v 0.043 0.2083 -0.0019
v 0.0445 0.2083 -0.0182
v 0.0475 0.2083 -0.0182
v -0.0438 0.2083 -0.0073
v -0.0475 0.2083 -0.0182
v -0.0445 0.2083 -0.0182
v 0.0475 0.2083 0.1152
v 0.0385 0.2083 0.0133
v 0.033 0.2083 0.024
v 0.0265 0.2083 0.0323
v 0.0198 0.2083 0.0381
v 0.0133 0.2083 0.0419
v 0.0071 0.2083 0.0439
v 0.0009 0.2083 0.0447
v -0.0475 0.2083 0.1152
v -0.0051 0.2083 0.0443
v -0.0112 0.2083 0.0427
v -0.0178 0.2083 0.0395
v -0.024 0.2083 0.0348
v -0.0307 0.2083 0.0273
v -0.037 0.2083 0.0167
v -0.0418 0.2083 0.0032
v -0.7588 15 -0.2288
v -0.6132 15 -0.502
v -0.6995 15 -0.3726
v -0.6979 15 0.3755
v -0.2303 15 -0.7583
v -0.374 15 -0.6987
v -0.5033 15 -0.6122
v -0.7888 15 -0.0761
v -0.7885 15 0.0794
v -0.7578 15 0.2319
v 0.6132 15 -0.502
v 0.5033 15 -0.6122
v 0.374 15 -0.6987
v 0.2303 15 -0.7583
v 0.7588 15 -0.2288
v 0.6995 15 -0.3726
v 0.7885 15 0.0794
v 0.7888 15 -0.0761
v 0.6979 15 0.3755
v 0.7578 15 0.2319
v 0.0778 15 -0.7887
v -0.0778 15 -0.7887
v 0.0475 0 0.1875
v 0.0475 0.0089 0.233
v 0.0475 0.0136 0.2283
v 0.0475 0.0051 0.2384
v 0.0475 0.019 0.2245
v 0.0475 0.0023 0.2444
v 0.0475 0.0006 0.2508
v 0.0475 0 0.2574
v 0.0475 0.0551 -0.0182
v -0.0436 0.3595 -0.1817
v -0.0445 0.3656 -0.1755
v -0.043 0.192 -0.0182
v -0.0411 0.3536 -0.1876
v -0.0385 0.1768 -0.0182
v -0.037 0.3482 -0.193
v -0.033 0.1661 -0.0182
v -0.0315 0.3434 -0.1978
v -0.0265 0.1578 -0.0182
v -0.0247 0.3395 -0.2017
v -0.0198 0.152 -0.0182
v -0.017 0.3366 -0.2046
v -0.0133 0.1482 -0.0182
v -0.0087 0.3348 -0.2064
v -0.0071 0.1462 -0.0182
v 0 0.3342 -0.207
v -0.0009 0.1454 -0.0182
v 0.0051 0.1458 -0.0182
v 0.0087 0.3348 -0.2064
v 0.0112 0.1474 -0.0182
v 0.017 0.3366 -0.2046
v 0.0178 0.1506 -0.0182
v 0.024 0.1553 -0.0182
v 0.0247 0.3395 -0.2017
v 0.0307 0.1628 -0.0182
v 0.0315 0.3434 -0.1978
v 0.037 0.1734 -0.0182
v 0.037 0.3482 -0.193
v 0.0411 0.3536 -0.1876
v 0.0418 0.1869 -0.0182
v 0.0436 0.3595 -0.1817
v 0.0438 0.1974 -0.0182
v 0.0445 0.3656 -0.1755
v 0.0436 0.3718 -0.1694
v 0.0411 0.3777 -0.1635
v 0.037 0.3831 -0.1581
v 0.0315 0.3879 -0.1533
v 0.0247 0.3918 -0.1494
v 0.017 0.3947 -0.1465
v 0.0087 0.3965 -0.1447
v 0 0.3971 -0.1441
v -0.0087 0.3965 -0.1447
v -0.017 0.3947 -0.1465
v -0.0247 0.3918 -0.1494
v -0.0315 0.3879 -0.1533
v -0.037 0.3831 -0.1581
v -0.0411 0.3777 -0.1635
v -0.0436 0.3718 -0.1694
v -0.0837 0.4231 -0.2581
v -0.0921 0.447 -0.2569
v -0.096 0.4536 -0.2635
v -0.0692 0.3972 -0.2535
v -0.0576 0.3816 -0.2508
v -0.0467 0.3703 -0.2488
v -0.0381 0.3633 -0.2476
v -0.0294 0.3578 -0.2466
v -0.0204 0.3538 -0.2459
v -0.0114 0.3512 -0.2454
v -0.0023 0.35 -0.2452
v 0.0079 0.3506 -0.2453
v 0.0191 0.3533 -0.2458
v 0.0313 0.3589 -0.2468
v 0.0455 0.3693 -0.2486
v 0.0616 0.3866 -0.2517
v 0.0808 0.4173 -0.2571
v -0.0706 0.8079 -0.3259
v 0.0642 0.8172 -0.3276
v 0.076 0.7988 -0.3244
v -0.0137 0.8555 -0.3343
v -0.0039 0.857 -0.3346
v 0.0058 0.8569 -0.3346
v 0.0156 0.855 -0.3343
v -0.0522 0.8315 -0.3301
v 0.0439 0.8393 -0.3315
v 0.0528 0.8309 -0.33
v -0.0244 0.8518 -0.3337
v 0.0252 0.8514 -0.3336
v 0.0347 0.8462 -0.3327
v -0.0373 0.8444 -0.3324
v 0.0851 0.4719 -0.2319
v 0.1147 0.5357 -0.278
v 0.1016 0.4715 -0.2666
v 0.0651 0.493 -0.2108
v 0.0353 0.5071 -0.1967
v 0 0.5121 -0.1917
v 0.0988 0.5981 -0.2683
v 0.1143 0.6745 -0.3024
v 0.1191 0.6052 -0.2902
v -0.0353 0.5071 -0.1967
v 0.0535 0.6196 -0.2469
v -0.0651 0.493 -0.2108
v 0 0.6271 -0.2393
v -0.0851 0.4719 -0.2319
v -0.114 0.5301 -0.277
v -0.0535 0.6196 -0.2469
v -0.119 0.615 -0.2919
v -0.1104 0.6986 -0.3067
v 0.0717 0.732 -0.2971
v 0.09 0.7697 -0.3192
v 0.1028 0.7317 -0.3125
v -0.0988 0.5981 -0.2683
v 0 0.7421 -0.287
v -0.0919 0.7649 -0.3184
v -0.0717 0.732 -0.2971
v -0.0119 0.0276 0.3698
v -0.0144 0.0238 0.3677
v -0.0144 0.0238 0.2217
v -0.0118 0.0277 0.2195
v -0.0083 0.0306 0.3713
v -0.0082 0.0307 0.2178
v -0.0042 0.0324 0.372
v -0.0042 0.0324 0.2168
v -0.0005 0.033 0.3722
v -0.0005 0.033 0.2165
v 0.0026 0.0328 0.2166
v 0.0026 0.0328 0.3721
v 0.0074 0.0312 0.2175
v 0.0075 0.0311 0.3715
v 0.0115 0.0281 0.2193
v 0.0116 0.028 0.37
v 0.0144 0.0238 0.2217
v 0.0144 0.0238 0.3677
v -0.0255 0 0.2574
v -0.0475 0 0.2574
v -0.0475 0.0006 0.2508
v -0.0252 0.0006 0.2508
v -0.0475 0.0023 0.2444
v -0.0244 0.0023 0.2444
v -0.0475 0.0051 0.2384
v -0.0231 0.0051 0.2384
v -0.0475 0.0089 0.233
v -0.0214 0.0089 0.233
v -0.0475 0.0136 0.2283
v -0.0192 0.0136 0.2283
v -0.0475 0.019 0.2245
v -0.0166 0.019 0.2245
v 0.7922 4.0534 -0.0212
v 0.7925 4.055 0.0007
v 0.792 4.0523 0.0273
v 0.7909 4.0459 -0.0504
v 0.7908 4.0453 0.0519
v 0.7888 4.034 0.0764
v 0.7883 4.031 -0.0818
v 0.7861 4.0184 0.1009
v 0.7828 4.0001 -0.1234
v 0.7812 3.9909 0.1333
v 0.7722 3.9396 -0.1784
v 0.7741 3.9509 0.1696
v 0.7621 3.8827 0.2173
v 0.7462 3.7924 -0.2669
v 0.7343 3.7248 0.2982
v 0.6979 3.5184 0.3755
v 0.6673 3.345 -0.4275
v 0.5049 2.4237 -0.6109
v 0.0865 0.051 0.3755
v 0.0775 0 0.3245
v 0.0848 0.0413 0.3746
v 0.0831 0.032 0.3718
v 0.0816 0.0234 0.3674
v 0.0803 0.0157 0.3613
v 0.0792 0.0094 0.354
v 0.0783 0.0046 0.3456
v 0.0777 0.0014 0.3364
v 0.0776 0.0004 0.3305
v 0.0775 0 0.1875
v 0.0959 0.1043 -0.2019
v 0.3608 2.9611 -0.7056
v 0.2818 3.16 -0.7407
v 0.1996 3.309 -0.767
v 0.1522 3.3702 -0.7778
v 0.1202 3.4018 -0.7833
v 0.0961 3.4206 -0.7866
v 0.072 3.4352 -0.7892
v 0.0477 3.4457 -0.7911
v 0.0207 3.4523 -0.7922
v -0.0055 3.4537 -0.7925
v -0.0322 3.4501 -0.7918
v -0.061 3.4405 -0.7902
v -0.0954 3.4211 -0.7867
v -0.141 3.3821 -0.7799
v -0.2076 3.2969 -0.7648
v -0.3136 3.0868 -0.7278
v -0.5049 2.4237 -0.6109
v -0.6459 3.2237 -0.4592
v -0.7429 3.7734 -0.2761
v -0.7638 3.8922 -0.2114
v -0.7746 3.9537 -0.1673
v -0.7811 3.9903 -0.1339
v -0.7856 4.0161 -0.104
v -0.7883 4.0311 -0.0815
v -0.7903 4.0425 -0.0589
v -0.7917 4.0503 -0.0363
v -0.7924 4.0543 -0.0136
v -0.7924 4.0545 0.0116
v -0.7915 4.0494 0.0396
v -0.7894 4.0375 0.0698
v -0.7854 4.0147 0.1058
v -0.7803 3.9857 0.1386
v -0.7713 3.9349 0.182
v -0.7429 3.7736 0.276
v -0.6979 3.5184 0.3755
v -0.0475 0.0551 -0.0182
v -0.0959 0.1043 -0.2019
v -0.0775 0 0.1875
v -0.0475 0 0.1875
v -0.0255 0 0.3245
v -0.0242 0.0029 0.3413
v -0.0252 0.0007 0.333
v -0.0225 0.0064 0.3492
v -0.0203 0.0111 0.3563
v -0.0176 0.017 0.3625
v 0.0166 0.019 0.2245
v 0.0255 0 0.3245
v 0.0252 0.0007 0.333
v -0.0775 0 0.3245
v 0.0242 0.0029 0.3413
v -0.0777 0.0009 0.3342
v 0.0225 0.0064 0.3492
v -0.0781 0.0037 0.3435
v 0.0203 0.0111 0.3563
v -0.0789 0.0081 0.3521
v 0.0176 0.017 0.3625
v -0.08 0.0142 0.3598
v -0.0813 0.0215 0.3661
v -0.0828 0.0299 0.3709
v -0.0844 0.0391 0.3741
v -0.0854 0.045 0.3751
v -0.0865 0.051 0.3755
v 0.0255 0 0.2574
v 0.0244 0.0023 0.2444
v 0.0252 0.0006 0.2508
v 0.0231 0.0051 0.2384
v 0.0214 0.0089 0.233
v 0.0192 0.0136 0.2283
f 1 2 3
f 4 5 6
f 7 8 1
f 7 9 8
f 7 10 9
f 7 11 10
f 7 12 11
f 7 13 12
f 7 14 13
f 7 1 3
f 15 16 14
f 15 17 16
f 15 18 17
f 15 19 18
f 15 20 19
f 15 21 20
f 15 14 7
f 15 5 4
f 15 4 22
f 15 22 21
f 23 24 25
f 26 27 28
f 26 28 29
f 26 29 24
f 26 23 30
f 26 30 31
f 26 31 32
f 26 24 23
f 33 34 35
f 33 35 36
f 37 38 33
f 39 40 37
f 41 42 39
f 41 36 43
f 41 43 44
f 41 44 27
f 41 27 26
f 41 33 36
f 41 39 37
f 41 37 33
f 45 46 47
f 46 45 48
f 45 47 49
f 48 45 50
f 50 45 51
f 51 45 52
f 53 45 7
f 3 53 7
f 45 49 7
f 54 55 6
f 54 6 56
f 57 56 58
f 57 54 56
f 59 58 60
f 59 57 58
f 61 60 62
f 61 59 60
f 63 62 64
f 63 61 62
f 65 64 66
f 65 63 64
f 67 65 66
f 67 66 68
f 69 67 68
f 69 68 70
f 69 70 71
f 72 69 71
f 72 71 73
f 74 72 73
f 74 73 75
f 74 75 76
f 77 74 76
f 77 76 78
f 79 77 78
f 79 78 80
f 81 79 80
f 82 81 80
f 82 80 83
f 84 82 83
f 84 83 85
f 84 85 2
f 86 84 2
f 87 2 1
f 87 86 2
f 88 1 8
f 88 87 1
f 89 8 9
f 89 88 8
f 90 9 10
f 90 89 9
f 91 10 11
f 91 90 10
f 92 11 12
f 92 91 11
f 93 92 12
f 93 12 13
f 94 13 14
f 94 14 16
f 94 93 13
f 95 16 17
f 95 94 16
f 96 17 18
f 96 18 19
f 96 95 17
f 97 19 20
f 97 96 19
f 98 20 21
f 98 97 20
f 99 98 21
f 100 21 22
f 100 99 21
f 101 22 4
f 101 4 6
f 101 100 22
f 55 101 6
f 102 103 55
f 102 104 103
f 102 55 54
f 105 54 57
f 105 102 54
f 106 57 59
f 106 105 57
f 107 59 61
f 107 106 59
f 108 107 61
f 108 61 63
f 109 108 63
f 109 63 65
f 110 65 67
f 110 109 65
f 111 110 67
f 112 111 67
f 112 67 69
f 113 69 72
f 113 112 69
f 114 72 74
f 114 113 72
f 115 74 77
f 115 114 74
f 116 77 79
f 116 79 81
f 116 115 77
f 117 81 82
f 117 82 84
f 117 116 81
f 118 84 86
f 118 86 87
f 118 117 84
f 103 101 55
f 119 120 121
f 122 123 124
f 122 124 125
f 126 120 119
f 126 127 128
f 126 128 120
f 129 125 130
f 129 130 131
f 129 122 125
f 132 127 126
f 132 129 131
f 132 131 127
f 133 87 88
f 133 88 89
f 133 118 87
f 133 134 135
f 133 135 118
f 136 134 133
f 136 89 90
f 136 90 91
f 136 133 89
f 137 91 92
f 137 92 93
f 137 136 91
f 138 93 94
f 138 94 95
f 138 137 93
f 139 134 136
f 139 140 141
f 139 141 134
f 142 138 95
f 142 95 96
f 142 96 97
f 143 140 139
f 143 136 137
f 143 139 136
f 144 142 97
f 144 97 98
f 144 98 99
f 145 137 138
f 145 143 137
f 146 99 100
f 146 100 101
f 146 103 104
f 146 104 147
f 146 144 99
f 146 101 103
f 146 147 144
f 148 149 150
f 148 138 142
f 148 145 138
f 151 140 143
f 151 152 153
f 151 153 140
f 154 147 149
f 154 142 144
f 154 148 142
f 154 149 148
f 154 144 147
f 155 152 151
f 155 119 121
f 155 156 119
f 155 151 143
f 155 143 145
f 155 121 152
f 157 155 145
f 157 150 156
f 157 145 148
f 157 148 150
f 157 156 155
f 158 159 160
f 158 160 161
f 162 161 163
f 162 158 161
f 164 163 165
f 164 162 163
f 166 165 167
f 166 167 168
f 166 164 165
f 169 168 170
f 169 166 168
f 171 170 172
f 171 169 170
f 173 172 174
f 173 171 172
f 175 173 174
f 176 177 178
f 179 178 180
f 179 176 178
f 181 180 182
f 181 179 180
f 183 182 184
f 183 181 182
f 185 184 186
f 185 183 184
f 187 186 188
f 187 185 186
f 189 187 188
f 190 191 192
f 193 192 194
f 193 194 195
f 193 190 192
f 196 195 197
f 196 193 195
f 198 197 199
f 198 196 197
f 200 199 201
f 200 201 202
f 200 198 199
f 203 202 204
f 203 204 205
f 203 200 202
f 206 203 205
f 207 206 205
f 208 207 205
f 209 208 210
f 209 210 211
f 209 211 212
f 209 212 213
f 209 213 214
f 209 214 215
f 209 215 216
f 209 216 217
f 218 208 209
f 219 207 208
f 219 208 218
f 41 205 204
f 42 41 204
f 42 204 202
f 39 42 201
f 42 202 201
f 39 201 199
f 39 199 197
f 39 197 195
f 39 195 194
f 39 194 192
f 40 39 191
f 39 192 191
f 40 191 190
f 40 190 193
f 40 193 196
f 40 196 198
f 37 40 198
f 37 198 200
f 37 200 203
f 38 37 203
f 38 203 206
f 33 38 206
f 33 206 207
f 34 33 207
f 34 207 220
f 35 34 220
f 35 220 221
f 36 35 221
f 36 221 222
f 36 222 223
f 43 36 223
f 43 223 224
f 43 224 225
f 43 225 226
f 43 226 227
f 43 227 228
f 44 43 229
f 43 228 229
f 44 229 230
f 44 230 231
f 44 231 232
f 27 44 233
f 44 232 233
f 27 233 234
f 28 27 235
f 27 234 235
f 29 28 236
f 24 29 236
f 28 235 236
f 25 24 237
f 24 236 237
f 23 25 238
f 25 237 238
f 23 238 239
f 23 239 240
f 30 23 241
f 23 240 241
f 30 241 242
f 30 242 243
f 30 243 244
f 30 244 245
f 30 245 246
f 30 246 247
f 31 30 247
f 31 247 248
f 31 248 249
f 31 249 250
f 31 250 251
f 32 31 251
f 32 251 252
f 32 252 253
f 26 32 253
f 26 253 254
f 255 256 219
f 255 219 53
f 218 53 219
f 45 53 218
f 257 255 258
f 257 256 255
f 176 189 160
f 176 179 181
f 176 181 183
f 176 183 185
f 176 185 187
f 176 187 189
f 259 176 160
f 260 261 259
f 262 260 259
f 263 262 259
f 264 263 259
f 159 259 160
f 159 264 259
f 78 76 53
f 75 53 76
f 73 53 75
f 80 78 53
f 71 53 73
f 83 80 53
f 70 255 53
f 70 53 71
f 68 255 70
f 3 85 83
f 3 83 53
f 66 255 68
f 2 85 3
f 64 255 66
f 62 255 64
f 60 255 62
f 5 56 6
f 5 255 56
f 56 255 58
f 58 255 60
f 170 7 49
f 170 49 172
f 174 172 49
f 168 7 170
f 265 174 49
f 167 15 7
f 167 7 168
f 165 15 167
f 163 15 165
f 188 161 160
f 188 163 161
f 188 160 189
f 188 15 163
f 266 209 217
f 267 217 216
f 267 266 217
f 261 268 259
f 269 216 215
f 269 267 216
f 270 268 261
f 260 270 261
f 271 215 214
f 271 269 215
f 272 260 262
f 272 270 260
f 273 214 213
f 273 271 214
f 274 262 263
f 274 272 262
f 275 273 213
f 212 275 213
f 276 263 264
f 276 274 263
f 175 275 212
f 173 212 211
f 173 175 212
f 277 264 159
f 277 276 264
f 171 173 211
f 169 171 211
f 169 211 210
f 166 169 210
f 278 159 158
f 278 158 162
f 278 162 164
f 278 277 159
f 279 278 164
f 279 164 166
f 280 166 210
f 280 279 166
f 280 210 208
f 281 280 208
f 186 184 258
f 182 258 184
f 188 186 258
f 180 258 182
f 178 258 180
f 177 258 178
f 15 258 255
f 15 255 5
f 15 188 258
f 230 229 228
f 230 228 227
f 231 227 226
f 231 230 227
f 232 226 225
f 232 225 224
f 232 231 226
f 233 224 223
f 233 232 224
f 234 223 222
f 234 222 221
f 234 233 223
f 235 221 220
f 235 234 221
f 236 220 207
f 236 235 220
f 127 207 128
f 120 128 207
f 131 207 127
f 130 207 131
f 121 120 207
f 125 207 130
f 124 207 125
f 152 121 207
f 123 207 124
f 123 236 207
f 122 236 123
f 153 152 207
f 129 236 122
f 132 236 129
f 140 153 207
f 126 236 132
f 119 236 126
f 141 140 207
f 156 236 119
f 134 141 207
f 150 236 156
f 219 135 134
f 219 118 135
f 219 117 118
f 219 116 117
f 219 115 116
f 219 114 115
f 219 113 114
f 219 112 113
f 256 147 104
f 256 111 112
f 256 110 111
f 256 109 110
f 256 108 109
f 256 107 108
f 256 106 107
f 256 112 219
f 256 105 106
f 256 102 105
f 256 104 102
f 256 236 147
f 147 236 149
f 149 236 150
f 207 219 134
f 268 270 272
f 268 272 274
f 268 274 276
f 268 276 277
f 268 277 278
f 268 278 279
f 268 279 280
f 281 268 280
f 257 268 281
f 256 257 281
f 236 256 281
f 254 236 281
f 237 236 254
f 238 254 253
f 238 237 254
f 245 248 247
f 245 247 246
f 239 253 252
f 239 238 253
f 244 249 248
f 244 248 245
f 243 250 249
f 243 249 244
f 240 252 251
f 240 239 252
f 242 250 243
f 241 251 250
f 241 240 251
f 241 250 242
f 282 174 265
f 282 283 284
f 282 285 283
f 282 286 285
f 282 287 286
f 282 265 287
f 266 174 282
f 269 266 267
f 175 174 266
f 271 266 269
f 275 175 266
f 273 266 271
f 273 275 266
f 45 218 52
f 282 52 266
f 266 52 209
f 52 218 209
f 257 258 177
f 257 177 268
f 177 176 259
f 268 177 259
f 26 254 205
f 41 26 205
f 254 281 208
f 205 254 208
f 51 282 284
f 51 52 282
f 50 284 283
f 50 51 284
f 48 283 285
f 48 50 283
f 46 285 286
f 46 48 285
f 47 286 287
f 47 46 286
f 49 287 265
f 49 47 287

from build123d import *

# Parameters (mm, degrees)
SKETCH_TL_CUTTING_R        = 0.7925
TL_CUTTING_DEPTH           = 15
SKETCH_TDF_GRINDING_W      = 1.605
SKETCH_TDF_GRINDING_H      = 1.605
TDF_GRINDING_DEPTH         = 16.041812141
ISA_GRINDING_DEPTH         = 0.8025
ISA_GRINDING_DEPTH_BACK    = 0.8025
BA_RA_GRINDING_DEPTH       = 0.8025
BA_RA_GRINDING_DEPTH_BACK  = 0.8025
FRO_ERODING_DEPTH          = 0.8025
FRO_ERODING_DEPTH_BACK     = 0.8025
CAVITY_ERODING_START       = -0.0475
CAVITY_ERODING_DEPTH       = 0.095
SKETCH_HOLE_CAVITY_ENTRY_R = 0.0445
SKETCH_END_CONST_SECTION_R = 0.0445
HOLE_START_FUNNEL_R        = 0.0445
SKETCH_END_FUNNEL_R        = 1.080033906
CUT_EXTRUDE1_REACH         = 17.066
FILLET1_R                  = 0.038


# Read off the part's stored shape, not the designer's step: cavity_eroding
with BuildPart() as part:
    # sketch_TL_cutting → TL_cutting (new body)
    with BuildSketch(Plane(origin=(0, 0, 0), x_dir=(1, 0, 0), z_dir=(0, 1, 0))):
        with Locations(Location((0, 0, 0), (0, 0, 270))):
            Circle(SKETCH_TL_CUTTING_R)
    extrude(amount=TL_CUTTING_DEPTH)

    # sketch_TDF_grinding → TDF_grinding (cut, through all)
    with BuildSketch(Plane(origin=(0, 0, 0), x_dir=(1, 0, 0), z_dir=(0, 1, 0))):
        with Locations((0, -1.178)):
            Rectangle(SKETCH_TDF_GRINDING_W, SKETCH_TDF_GRINDING_H)
    extrude(amount=TDF_GRINDING_DEPTH, mode=Mode.SUBTRACT)

    # sketch_ISA_grinding → ISA_grinding (cut, two sides: drawn at the far end of the back side and taken through both)
    with BuildSketch(Plane.XY.offset(-ISA_GRINDING_DEPTH_BACK)):
        Polygon((-0.0775, 0), (-0.8025, 4.111679319), (-0.8025, -0.01), (0.8025, -0.01), (0.8025, 4.111679319), (0.0775, 0), align=None)
    extrude(amount=ISA_GRINDING_DEPTH + ISA_GRINDING_DEPTH_BACK, mode=Mode.SUBTRACT)

    # sketch_BA_RA_grinding → BA_RA_grinding (cut, two sides: drawn at the far end of the back side and taken through both)
    with BuildSketch(Plane(origin=(0, 0, 0), x_dir=(0, 0, -1), z_dir=(1, 0, 0)).offset(-BA_RA_GRINDING_DEPTH_BACK)):
        Polygon((-0.1875, 0), (-0.3755, 0), (-0.3755, -0.01), (4.01816798, -0.01), (4.01816798, 15.01), (2.83016798, 15.01), (0.201897748, 0.104338812), align=None)
    extrude(amount=BA_RA_GRINDING_DEPTH + BA_RA_GRINDING_DEPTH_BACK, mode=Mode.SUBTRACT)

    # sketch_FRO_eroding → FRO_eroding (cut, two sides: drawn at the far end of the back side and taken through both)
    with BuildSketch(Plane(origin=(0, 0, 0), x_dir=(0, 0, -1), z_dir=(1, 0, 0)).offset(-FRO_ERODING_DEPTH_BACK)):
        with BuildLine():
            Line((-0.3755, 0.051), (-0.3855, 0.051))
            Line((-0.3855, 0.051), (-0.3855, -0.01))
            Line((-0.3855, -0.01), (-0.3245, -0.01))
            Line((-0.3245, -0.01), (-0.3245, 0))
            ThreePointArc((-0.3245, 0), (-0.360562446, 0.014937554), (-0.3755, 0.051))
        make_face()
    extrude(amount=FRO_ERODING_DEPTH + FRO_ERODING_DEPTH_BACK, mode=Mode.SUBTRACT)

    # cavity_eroding outline → cavity_eroding (cut)
    with BuildSketch(Plane.YZ.offset(CAVITY_ERODING_START)):
        Polygon((0, 0.1875), (0.055117149, -0.0182), (0.2083, -0.0182), (0.2083, 0.115237939), (0, 0.2355), align=None)
    extrude(amount=CAVITY_ERODING_DEPTH, mode=Mode.SUBTRACT)

    # sketch_hole_cavity_entry → hole_const_section section 0
    with BuildSketch(Plane(origin=(0, 0.162691609, 0.027408387), x_dir=(-1, 0, 0), z_dir=(0, -0.7071067811865479, 0.7071067811865472))):
        Circle(SKETCH_HOLE_CAVITY_ENTRY_R)
    # sketch_end_const_section → hole_const_section section 1
    with BuildSketch(Plane(origin=(0, 0.365639833, -0.175539837), x_dir=(-1, 0, 0), z_dir=(0, -0.7071067811865479, 0.7071067811865472))):
        Circle(SKETCH_END_CONST_SECTION_R)
    loft(mode=Mode.SUBTRACT)

    # hole_start_funnel → hole_funnel section 0
    with BuildSketch(Plane(origin=(0, 0.365639833, -0.175539837), x_dir=(-1, 0, 0), z_dir=(0, -0.7071067811865479, 0.7071067811865472))):
        Circle(HOLE_START_FUNNEL_R)
    # sketch_end_funnel → hole_funnel section 1
    with BuildSketch(Plane(origin=(0, 2.133406786, -1.94330679), x_dir=(-1, 0, 0), z_dir=(0, -0.7071067811865479, 0.7071067811865472))):
        Circle(SKETCH_END_FUNNEL_R)
    loft(mode=Mode.SUBTRACT)

    # Sketch1 → Cut-Extrude1 (cut, up to next)
    with BuildSketch(Plane.XY.offset(0.3755), mode=Mode.PRIVATE) as cut_extrude1_sk1:
        with BuildLine():
            Line((-0.030697365, -0.011145784), (-0.014385299, 0.023835554))
            ThreePointArc((-0.014385299, 0.023835554), (0, 0.033), (0.014385299, 0.023835554))
            Line((0.014385299, 0.023835554), (0.030697365, -0.011145784))
            Line((0.030697365, -0.011145784), (-0.030697365, -0.011145784))
        make_face()
    cut_extrude1_tool1 = extrude(cut_extrude1_sk1.sketch, amount=-CUT_EXTRUDE1_REACH, mode=Mode.PRIVATE) & part.part
    add(cut_extrude1_tool1.solids().sort_by_distance((0, 0.006741, 0.3755))[0], mode=Mode.SUBTRACT)

    # Fillet1
    fillet1_edges = [part.edges().sort_by_distance(p)[0] for p in [
        (0.0365, 0, 0.2355),
        (-0.0365, 0, 0.2355),
    ]]
    fillet(fillet1_edges, radius=FILLET1_R)


solid = part.part
